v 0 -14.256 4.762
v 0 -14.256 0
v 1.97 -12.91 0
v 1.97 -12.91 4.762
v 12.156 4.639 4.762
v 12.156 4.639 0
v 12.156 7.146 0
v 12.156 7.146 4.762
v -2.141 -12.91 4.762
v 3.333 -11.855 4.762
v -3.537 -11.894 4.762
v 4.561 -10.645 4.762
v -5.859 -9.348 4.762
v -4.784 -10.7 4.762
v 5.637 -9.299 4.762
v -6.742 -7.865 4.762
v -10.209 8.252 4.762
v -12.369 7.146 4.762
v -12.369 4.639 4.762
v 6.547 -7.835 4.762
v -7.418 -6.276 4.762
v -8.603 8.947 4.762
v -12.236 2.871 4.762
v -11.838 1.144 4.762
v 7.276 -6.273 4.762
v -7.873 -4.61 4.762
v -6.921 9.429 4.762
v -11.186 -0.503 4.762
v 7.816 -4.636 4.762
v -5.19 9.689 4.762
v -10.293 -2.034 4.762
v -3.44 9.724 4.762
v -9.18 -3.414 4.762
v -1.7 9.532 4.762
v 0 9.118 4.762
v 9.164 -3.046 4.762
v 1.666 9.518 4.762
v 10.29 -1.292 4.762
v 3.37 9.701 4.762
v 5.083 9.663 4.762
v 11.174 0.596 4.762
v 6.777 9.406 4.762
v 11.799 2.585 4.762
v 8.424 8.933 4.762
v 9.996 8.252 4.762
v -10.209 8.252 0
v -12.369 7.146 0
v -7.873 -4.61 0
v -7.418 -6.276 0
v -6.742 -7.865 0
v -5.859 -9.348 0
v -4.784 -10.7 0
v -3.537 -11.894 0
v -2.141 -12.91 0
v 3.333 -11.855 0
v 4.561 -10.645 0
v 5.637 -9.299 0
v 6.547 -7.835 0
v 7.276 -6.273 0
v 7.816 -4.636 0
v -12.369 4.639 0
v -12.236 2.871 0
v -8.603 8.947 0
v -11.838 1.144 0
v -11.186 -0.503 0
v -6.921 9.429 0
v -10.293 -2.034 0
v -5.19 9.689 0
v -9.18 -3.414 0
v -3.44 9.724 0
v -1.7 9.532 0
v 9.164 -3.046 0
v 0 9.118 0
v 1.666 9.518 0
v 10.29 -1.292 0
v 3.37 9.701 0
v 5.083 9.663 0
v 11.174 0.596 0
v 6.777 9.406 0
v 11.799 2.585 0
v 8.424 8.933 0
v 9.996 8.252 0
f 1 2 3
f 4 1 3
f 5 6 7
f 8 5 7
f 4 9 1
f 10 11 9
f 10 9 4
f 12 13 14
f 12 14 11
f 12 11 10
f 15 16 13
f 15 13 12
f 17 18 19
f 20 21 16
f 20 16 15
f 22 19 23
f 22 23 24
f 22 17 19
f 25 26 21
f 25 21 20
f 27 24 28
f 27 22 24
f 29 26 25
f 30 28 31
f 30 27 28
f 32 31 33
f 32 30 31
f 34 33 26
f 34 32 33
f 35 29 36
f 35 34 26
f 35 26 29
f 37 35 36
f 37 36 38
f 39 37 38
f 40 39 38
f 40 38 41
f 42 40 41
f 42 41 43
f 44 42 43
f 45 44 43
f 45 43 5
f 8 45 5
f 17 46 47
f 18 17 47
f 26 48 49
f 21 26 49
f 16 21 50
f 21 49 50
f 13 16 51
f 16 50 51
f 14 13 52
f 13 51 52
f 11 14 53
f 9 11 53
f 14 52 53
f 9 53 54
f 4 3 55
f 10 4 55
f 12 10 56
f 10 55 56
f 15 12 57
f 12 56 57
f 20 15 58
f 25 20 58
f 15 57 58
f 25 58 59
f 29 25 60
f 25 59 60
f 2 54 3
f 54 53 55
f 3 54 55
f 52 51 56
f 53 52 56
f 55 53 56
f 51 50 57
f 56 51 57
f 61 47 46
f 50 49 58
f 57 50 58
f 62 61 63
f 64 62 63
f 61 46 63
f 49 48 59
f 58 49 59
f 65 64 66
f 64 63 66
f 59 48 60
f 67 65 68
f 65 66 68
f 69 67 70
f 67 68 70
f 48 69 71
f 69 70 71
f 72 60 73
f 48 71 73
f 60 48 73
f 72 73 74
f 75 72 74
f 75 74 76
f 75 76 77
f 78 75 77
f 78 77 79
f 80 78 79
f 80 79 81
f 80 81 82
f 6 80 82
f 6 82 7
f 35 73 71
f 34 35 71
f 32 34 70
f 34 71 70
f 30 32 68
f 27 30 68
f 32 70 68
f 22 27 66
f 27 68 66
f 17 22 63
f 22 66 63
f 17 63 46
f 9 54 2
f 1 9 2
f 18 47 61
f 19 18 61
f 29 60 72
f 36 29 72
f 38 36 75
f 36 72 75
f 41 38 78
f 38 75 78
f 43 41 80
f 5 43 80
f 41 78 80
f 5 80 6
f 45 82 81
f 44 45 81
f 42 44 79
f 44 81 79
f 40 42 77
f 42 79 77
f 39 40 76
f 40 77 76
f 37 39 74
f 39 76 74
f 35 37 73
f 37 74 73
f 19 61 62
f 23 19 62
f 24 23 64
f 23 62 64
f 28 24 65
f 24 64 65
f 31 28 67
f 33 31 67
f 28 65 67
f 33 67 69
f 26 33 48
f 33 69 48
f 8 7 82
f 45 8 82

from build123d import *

# Parameters (mm, degrees)
F1_DEPTH = 4.7625


with BuildPart() as f1:
    # F0 (on Top) → F1 (new body)
    with BuildSketch(Plane.XY):
        with BuildLine():
            ThreePointArc((0, 9.117891), (-5.189841, 9.689006), (-10.209356, 8.251961))
            Line((-10.209356, 8.251961), (-12.369341, 7.146457))
            Line((-12.369341, 7.146457), (-12.369341, 4.638605))
            ThreePointArc((-12.369341, 4.638605), (-11.185748, -0.503205), (-7.873208, -4.610051))
            ThreePointArc((-7.873208, -4.610051), (-5.859185, -9.348483), (-2.140938, -12.909897))
            Line((-2.140938, -12.909897), (0, -14.256157))
            Line((0, -14.256157), (1.969674, -12.909897))
            ThreePointArc((1.969674, -12.909897), (5.637264, -9.298956), (7.81588, -4.635937))
            ThreePointArc((7.81588, -4.635937), (10.7633, -0.362437), (12.15602, 4.638605))
            Line((12.15602, 4.638605), (12.15602, 7.146457))
            Line((12.15602, 7.146457), (9.996034, 8.251961))
            ThreePointArc((9.996034, 8.251961), (5.082776, 9.663363), (0, 9.117891))
        make_face()
    extrude(amount=F1_DEPTH)


solid = f1.part
